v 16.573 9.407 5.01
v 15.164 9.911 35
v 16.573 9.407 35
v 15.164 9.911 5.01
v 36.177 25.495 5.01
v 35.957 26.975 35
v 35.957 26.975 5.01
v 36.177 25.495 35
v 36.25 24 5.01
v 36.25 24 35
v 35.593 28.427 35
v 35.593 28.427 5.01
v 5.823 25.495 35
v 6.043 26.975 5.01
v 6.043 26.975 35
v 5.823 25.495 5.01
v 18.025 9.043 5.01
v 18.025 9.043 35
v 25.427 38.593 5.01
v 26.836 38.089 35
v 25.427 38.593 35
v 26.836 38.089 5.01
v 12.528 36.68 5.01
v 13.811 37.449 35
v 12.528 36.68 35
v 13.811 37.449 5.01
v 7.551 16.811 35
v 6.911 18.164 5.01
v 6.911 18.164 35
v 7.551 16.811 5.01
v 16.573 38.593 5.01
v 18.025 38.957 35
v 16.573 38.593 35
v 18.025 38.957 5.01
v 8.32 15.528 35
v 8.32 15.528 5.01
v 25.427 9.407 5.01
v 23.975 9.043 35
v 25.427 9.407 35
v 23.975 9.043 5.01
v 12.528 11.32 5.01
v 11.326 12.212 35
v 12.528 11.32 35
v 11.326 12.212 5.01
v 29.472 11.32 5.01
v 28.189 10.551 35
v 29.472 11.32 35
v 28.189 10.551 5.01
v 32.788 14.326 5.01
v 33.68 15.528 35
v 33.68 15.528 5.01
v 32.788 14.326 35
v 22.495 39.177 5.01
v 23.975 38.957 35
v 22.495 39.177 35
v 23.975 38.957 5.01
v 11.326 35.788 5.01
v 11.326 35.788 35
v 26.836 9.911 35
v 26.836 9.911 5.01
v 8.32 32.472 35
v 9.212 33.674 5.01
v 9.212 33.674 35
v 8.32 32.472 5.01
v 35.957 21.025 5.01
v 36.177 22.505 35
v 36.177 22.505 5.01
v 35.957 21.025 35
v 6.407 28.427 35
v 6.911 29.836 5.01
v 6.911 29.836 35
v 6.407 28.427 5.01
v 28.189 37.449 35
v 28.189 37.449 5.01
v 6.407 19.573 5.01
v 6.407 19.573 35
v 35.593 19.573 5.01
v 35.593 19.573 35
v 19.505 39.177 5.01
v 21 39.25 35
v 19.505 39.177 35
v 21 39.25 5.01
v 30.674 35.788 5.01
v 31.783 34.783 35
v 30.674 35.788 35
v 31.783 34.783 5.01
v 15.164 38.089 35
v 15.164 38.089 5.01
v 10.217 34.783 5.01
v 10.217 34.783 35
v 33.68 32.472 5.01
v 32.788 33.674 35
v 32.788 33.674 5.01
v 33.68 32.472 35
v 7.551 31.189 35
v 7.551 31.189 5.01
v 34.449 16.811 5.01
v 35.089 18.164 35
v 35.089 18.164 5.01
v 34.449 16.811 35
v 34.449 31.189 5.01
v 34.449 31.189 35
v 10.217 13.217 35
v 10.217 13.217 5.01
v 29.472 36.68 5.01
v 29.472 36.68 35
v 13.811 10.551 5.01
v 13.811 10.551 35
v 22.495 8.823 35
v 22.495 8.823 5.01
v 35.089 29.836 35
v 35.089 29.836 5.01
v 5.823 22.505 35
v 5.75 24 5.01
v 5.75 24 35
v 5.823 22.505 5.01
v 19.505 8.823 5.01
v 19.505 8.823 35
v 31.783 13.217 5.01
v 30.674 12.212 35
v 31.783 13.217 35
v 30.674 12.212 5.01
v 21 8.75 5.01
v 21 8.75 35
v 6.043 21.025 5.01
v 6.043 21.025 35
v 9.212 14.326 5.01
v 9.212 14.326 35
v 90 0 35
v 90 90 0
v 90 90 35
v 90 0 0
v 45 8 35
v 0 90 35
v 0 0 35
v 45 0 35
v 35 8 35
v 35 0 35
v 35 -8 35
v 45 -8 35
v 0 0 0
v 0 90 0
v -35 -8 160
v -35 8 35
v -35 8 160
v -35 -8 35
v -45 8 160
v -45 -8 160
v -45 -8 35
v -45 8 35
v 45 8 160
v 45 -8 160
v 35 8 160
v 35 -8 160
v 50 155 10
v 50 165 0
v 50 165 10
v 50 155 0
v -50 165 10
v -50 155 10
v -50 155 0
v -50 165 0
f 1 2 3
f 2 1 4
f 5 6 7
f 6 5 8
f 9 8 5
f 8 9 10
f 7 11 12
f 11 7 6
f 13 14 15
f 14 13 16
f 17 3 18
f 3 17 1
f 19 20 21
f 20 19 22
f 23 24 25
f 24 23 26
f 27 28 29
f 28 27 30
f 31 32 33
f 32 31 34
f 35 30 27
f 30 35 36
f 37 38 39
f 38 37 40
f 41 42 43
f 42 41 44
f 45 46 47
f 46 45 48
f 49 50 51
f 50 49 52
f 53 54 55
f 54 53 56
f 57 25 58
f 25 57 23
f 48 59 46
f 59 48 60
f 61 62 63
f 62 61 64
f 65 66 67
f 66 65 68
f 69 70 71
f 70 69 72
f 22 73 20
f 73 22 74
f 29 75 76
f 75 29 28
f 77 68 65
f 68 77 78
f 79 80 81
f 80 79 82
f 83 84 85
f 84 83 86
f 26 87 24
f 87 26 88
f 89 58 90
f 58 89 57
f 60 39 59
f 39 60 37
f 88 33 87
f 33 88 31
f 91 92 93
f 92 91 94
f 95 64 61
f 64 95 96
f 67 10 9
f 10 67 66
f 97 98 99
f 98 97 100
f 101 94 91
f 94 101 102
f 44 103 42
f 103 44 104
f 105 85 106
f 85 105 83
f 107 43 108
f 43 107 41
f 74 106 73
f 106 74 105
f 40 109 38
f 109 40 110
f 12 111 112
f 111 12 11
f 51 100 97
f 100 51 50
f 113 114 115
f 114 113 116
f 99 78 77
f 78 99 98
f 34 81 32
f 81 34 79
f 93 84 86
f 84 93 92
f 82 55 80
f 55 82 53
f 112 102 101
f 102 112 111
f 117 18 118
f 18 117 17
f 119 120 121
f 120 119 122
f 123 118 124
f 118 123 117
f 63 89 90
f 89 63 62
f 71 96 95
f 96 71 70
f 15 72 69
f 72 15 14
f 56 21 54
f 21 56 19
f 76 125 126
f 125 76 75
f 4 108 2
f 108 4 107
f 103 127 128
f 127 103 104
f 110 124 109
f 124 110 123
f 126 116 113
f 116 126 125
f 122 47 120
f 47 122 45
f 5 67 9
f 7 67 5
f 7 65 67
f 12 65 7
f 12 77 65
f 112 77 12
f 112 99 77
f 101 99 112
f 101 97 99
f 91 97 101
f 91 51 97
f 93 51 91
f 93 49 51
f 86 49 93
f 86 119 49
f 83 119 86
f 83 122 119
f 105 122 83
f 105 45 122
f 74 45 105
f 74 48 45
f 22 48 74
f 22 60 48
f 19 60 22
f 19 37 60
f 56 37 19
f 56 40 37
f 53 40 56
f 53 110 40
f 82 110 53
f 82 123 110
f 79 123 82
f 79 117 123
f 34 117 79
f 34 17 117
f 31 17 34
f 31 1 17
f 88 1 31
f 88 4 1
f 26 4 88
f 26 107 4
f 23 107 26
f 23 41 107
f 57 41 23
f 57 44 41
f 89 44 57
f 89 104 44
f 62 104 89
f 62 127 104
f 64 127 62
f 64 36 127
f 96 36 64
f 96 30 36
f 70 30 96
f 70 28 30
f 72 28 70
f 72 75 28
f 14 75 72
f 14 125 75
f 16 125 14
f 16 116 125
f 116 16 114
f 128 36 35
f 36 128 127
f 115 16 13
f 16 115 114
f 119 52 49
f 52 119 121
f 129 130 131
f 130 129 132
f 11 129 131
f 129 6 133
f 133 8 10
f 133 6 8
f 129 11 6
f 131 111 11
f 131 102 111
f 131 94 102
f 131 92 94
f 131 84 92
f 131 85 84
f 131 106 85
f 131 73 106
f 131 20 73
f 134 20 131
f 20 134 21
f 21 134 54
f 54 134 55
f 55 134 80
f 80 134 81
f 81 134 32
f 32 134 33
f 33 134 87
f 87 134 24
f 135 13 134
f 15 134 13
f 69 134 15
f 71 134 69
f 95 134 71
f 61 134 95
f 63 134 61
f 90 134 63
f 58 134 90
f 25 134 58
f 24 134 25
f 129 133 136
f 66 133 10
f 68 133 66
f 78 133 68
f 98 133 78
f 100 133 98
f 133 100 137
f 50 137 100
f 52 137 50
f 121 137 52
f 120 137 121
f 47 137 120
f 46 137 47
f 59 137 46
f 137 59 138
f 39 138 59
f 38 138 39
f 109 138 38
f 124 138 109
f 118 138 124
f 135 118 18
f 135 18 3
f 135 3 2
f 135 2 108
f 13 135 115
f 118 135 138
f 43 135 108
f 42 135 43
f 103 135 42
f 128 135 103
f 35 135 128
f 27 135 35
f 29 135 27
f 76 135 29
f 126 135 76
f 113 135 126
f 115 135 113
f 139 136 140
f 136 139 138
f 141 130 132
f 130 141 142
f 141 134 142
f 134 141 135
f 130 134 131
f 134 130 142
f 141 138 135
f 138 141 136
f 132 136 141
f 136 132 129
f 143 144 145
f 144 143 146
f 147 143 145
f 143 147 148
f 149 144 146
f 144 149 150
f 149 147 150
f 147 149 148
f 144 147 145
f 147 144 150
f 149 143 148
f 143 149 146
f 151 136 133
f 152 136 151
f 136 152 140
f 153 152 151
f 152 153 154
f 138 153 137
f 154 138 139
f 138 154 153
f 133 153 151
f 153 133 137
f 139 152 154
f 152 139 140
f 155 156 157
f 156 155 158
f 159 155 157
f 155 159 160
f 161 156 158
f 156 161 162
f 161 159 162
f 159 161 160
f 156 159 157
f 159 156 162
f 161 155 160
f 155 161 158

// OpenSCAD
// --- Parameters ---

// Part 1: Base Block Dimensions
base_width_x = 90;           // X dimension of base
base_depth_y = 90;           // Y dimension of base
base_height_z = 35;          // Z dimension of base

// Tube Seat Dimensions (Blind holes)
seat_diameter = 30.5;         // Diameter of the tube seats
seat_depth = 30;             // Depth of the seats (leaving 5mm floor)
seat_x_pos = [-21, 21];       // X coordinates of seats
seat_y_pos = [-24, 24];       // Y coordinates of seats

// Post Dimensions
post_thickness_x = 10;        // Thickness of posts along X
post_width_y = 16;            // Width of posts along Y
post_top_z = 160;             // The top of the posts is at Z = 160
post_hole_size = 10.4;        // Square hole size
post_hole_z_center = 150;     // Z center of the square hole

// Part 2: Handle Dimensions
handle_length_x = 100;        // Length of the handle along X
handle_thickness_y = 10;      // Thickness of the handle (Y)
handle_height_z = 10;         // Height of the handle (Z)
handle_y_start = 55;          // Start Y position (offset from base)
handle_y_end = 65;            // End Y position

// Resolution
fn_val = 64;

// --- Part 1: Base and Posts ---

module part_1() {
    // The Base Block
    // Requirement: rests on XY plane at z=0.
    // Base is 35mm tall.
    difference() {
        // Main block
        cube([base_width_x, base_depth_y, base_height_z]);
        
        // The four blind seats
        // Seats are centered at specified X, Y. 
        // They are blind, so they cut from the top (Z=35) downwards.
        for (i = [0:1]) {
            for (j = [0:1]) {
                translate([seat_x_pos[i], seat_y_pos[j], base_height_z - seat_depth + 0.01])
                    cylinder(h = seat_depth + 0.02, d = seat_diameter, $fn = fn_val);
            }
        }
    }

    // The two posts
    // Requirement: "stand on the base", "rise to z=160", "flush with end faces", "centered on y=0"
    // Base is 90x90, so end faces are at x=0 and x=90 (if not centered) or x=-45 and x=45 (if centered).
    // Since the base is centered on origin, end faces are at x = -45 and x = 45.
    // Post 1 (Left): X from -45 to -35. Post 2 (Right): X from 35 to 45.
    // Post Y: Centered on 0, width 16 -> Y from -8 to 8.
    // Post Z: From base top (35) to 160.
    
    for (x_offset = [-base_width_x/2, base_width_x/2 - post_thickness_x]) {
        translate([x_offset, -post_width_y/2, base_height_z])
        difference() {
            // Post body
            cube([post_thickness_x, post_width_y, post_top_z - base_height_z]);
            
            // The square hole through the post along X
            // Centered at Z = 150.
            // Hole is 10.4 x 10.4.
            // To ensure it cuts through, we extend X by 2mm.
            translate([-1, -post_hole_size/2, post_hole_z_center - post_hole_size/2])
                cube([post_thickness_x + 2, post_hole_size, post_hole_size]);
        }
    }
}

// --- Part 2: Handle ---

module part_2() {
    // Requirement: "square bar 10x10mm and 100mm long, lying on the bed along X and centred on x=0"
    // "spans y = 55 to 65"
    // "rests on the bed at z=0"
    // Since it is 10mm thick (Y) and spans 55 to 65, center is at Y=60.
    // Since it is 10mm high (Z) and rests on bed, Z goes from 0 to 10.
    
    translate([-handle_length_x/2, handle_y_start, 0])
        cube([handle_length_x, handle_thickness_y, handle_height_z]);
}

// --- Rendering ---

// Part 1: Base and Posts
// Centered on origin in X and Y.
// Base is 90x90, so it spans X: -45 to 45, Y: -45 to 45.
translate([0, 0, 0]) 
    part_1();

// Part 2: Handle
// "lying on the bed along X and centred on x=0"
// "10mm gap to the base's +Y face" -> Base +Y face is at Y=45. 
// Gap of 10mm means handle starts at Y = 45 + 10 = 55.
// Handle spans Y = 55 to 65.
// To print side-by-side, we place it at a safe distance.
translate([0, 100, 0]) 
    part_2();
